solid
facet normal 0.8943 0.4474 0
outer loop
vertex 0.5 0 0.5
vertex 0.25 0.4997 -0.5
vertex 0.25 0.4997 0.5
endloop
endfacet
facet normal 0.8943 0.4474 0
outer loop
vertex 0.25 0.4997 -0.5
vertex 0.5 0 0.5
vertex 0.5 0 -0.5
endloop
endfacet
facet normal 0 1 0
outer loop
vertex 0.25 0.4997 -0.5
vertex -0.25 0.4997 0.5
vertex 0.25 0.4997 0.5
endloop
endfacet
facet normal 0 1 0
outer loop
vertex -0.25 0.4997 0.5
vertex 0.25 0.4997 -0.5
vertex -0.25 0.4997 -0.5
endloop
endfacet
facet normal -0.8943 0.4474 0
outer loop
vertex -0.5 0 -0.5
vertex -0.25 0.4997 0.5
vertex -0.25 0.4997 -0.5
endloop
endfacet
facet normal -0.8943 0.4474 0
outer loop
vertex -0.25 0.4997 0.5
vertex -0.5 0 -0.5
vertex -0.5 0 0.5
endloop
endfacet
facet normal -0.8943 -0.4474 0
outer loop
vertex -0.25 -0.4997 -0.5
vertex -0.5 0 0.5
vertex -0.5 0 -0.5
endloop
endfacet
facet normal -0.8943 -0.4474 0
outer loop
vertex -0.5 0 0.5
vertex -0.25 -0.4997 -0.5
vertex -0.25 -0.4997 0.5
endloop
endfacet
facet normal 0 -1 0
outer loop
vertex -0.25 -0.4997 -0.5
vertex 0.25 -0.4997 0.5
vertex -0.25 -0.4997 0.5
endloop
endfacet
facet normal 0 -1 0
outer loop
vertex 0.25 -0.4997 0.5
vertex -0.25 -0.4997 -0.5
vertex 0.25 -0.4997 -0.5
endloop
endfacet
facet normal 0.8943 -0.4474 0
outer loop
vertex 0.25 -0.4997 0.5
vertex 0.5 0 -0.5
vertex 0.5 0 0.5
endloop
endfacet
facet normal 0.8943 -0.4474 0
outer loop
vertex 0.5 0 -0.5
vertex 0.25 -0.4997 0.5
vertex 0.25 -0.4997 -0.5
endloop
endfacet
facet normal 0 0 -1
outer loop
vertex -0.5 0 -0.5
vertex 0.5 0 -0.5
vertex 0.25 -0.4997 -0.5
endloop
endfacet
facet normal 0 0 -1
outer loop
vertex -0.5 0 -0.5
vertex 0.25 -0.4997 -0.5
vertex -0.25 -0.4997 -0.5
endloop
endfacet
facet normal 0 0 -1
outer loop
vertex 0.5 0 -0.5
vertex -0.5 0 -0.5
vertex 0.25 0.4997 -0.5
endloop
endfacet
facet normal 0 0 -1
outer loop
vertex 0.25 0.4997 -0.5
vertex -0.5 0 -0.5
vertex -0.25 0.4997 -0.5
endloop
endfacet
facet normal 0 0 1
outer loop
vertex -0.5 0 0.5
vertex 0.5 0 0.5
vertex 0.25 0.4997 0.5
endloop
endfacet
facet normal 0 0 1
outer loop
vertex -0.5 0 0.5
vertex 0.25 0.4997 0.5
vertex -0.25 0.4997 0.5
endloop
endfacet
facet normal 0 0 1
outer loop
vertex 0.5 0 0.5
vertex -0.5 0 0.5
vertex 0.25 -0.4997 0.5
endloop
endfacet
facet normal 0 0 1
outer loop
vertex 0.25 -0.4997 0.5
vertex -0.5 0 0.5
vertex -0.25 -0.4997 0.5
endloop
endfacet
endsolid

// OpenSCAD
rotate([0.0000000000, 0.0000000000, -0.0000000000]) {
  scale([0.5, 0.577, 1]) cylinder($fn = 6, center = true);
}
